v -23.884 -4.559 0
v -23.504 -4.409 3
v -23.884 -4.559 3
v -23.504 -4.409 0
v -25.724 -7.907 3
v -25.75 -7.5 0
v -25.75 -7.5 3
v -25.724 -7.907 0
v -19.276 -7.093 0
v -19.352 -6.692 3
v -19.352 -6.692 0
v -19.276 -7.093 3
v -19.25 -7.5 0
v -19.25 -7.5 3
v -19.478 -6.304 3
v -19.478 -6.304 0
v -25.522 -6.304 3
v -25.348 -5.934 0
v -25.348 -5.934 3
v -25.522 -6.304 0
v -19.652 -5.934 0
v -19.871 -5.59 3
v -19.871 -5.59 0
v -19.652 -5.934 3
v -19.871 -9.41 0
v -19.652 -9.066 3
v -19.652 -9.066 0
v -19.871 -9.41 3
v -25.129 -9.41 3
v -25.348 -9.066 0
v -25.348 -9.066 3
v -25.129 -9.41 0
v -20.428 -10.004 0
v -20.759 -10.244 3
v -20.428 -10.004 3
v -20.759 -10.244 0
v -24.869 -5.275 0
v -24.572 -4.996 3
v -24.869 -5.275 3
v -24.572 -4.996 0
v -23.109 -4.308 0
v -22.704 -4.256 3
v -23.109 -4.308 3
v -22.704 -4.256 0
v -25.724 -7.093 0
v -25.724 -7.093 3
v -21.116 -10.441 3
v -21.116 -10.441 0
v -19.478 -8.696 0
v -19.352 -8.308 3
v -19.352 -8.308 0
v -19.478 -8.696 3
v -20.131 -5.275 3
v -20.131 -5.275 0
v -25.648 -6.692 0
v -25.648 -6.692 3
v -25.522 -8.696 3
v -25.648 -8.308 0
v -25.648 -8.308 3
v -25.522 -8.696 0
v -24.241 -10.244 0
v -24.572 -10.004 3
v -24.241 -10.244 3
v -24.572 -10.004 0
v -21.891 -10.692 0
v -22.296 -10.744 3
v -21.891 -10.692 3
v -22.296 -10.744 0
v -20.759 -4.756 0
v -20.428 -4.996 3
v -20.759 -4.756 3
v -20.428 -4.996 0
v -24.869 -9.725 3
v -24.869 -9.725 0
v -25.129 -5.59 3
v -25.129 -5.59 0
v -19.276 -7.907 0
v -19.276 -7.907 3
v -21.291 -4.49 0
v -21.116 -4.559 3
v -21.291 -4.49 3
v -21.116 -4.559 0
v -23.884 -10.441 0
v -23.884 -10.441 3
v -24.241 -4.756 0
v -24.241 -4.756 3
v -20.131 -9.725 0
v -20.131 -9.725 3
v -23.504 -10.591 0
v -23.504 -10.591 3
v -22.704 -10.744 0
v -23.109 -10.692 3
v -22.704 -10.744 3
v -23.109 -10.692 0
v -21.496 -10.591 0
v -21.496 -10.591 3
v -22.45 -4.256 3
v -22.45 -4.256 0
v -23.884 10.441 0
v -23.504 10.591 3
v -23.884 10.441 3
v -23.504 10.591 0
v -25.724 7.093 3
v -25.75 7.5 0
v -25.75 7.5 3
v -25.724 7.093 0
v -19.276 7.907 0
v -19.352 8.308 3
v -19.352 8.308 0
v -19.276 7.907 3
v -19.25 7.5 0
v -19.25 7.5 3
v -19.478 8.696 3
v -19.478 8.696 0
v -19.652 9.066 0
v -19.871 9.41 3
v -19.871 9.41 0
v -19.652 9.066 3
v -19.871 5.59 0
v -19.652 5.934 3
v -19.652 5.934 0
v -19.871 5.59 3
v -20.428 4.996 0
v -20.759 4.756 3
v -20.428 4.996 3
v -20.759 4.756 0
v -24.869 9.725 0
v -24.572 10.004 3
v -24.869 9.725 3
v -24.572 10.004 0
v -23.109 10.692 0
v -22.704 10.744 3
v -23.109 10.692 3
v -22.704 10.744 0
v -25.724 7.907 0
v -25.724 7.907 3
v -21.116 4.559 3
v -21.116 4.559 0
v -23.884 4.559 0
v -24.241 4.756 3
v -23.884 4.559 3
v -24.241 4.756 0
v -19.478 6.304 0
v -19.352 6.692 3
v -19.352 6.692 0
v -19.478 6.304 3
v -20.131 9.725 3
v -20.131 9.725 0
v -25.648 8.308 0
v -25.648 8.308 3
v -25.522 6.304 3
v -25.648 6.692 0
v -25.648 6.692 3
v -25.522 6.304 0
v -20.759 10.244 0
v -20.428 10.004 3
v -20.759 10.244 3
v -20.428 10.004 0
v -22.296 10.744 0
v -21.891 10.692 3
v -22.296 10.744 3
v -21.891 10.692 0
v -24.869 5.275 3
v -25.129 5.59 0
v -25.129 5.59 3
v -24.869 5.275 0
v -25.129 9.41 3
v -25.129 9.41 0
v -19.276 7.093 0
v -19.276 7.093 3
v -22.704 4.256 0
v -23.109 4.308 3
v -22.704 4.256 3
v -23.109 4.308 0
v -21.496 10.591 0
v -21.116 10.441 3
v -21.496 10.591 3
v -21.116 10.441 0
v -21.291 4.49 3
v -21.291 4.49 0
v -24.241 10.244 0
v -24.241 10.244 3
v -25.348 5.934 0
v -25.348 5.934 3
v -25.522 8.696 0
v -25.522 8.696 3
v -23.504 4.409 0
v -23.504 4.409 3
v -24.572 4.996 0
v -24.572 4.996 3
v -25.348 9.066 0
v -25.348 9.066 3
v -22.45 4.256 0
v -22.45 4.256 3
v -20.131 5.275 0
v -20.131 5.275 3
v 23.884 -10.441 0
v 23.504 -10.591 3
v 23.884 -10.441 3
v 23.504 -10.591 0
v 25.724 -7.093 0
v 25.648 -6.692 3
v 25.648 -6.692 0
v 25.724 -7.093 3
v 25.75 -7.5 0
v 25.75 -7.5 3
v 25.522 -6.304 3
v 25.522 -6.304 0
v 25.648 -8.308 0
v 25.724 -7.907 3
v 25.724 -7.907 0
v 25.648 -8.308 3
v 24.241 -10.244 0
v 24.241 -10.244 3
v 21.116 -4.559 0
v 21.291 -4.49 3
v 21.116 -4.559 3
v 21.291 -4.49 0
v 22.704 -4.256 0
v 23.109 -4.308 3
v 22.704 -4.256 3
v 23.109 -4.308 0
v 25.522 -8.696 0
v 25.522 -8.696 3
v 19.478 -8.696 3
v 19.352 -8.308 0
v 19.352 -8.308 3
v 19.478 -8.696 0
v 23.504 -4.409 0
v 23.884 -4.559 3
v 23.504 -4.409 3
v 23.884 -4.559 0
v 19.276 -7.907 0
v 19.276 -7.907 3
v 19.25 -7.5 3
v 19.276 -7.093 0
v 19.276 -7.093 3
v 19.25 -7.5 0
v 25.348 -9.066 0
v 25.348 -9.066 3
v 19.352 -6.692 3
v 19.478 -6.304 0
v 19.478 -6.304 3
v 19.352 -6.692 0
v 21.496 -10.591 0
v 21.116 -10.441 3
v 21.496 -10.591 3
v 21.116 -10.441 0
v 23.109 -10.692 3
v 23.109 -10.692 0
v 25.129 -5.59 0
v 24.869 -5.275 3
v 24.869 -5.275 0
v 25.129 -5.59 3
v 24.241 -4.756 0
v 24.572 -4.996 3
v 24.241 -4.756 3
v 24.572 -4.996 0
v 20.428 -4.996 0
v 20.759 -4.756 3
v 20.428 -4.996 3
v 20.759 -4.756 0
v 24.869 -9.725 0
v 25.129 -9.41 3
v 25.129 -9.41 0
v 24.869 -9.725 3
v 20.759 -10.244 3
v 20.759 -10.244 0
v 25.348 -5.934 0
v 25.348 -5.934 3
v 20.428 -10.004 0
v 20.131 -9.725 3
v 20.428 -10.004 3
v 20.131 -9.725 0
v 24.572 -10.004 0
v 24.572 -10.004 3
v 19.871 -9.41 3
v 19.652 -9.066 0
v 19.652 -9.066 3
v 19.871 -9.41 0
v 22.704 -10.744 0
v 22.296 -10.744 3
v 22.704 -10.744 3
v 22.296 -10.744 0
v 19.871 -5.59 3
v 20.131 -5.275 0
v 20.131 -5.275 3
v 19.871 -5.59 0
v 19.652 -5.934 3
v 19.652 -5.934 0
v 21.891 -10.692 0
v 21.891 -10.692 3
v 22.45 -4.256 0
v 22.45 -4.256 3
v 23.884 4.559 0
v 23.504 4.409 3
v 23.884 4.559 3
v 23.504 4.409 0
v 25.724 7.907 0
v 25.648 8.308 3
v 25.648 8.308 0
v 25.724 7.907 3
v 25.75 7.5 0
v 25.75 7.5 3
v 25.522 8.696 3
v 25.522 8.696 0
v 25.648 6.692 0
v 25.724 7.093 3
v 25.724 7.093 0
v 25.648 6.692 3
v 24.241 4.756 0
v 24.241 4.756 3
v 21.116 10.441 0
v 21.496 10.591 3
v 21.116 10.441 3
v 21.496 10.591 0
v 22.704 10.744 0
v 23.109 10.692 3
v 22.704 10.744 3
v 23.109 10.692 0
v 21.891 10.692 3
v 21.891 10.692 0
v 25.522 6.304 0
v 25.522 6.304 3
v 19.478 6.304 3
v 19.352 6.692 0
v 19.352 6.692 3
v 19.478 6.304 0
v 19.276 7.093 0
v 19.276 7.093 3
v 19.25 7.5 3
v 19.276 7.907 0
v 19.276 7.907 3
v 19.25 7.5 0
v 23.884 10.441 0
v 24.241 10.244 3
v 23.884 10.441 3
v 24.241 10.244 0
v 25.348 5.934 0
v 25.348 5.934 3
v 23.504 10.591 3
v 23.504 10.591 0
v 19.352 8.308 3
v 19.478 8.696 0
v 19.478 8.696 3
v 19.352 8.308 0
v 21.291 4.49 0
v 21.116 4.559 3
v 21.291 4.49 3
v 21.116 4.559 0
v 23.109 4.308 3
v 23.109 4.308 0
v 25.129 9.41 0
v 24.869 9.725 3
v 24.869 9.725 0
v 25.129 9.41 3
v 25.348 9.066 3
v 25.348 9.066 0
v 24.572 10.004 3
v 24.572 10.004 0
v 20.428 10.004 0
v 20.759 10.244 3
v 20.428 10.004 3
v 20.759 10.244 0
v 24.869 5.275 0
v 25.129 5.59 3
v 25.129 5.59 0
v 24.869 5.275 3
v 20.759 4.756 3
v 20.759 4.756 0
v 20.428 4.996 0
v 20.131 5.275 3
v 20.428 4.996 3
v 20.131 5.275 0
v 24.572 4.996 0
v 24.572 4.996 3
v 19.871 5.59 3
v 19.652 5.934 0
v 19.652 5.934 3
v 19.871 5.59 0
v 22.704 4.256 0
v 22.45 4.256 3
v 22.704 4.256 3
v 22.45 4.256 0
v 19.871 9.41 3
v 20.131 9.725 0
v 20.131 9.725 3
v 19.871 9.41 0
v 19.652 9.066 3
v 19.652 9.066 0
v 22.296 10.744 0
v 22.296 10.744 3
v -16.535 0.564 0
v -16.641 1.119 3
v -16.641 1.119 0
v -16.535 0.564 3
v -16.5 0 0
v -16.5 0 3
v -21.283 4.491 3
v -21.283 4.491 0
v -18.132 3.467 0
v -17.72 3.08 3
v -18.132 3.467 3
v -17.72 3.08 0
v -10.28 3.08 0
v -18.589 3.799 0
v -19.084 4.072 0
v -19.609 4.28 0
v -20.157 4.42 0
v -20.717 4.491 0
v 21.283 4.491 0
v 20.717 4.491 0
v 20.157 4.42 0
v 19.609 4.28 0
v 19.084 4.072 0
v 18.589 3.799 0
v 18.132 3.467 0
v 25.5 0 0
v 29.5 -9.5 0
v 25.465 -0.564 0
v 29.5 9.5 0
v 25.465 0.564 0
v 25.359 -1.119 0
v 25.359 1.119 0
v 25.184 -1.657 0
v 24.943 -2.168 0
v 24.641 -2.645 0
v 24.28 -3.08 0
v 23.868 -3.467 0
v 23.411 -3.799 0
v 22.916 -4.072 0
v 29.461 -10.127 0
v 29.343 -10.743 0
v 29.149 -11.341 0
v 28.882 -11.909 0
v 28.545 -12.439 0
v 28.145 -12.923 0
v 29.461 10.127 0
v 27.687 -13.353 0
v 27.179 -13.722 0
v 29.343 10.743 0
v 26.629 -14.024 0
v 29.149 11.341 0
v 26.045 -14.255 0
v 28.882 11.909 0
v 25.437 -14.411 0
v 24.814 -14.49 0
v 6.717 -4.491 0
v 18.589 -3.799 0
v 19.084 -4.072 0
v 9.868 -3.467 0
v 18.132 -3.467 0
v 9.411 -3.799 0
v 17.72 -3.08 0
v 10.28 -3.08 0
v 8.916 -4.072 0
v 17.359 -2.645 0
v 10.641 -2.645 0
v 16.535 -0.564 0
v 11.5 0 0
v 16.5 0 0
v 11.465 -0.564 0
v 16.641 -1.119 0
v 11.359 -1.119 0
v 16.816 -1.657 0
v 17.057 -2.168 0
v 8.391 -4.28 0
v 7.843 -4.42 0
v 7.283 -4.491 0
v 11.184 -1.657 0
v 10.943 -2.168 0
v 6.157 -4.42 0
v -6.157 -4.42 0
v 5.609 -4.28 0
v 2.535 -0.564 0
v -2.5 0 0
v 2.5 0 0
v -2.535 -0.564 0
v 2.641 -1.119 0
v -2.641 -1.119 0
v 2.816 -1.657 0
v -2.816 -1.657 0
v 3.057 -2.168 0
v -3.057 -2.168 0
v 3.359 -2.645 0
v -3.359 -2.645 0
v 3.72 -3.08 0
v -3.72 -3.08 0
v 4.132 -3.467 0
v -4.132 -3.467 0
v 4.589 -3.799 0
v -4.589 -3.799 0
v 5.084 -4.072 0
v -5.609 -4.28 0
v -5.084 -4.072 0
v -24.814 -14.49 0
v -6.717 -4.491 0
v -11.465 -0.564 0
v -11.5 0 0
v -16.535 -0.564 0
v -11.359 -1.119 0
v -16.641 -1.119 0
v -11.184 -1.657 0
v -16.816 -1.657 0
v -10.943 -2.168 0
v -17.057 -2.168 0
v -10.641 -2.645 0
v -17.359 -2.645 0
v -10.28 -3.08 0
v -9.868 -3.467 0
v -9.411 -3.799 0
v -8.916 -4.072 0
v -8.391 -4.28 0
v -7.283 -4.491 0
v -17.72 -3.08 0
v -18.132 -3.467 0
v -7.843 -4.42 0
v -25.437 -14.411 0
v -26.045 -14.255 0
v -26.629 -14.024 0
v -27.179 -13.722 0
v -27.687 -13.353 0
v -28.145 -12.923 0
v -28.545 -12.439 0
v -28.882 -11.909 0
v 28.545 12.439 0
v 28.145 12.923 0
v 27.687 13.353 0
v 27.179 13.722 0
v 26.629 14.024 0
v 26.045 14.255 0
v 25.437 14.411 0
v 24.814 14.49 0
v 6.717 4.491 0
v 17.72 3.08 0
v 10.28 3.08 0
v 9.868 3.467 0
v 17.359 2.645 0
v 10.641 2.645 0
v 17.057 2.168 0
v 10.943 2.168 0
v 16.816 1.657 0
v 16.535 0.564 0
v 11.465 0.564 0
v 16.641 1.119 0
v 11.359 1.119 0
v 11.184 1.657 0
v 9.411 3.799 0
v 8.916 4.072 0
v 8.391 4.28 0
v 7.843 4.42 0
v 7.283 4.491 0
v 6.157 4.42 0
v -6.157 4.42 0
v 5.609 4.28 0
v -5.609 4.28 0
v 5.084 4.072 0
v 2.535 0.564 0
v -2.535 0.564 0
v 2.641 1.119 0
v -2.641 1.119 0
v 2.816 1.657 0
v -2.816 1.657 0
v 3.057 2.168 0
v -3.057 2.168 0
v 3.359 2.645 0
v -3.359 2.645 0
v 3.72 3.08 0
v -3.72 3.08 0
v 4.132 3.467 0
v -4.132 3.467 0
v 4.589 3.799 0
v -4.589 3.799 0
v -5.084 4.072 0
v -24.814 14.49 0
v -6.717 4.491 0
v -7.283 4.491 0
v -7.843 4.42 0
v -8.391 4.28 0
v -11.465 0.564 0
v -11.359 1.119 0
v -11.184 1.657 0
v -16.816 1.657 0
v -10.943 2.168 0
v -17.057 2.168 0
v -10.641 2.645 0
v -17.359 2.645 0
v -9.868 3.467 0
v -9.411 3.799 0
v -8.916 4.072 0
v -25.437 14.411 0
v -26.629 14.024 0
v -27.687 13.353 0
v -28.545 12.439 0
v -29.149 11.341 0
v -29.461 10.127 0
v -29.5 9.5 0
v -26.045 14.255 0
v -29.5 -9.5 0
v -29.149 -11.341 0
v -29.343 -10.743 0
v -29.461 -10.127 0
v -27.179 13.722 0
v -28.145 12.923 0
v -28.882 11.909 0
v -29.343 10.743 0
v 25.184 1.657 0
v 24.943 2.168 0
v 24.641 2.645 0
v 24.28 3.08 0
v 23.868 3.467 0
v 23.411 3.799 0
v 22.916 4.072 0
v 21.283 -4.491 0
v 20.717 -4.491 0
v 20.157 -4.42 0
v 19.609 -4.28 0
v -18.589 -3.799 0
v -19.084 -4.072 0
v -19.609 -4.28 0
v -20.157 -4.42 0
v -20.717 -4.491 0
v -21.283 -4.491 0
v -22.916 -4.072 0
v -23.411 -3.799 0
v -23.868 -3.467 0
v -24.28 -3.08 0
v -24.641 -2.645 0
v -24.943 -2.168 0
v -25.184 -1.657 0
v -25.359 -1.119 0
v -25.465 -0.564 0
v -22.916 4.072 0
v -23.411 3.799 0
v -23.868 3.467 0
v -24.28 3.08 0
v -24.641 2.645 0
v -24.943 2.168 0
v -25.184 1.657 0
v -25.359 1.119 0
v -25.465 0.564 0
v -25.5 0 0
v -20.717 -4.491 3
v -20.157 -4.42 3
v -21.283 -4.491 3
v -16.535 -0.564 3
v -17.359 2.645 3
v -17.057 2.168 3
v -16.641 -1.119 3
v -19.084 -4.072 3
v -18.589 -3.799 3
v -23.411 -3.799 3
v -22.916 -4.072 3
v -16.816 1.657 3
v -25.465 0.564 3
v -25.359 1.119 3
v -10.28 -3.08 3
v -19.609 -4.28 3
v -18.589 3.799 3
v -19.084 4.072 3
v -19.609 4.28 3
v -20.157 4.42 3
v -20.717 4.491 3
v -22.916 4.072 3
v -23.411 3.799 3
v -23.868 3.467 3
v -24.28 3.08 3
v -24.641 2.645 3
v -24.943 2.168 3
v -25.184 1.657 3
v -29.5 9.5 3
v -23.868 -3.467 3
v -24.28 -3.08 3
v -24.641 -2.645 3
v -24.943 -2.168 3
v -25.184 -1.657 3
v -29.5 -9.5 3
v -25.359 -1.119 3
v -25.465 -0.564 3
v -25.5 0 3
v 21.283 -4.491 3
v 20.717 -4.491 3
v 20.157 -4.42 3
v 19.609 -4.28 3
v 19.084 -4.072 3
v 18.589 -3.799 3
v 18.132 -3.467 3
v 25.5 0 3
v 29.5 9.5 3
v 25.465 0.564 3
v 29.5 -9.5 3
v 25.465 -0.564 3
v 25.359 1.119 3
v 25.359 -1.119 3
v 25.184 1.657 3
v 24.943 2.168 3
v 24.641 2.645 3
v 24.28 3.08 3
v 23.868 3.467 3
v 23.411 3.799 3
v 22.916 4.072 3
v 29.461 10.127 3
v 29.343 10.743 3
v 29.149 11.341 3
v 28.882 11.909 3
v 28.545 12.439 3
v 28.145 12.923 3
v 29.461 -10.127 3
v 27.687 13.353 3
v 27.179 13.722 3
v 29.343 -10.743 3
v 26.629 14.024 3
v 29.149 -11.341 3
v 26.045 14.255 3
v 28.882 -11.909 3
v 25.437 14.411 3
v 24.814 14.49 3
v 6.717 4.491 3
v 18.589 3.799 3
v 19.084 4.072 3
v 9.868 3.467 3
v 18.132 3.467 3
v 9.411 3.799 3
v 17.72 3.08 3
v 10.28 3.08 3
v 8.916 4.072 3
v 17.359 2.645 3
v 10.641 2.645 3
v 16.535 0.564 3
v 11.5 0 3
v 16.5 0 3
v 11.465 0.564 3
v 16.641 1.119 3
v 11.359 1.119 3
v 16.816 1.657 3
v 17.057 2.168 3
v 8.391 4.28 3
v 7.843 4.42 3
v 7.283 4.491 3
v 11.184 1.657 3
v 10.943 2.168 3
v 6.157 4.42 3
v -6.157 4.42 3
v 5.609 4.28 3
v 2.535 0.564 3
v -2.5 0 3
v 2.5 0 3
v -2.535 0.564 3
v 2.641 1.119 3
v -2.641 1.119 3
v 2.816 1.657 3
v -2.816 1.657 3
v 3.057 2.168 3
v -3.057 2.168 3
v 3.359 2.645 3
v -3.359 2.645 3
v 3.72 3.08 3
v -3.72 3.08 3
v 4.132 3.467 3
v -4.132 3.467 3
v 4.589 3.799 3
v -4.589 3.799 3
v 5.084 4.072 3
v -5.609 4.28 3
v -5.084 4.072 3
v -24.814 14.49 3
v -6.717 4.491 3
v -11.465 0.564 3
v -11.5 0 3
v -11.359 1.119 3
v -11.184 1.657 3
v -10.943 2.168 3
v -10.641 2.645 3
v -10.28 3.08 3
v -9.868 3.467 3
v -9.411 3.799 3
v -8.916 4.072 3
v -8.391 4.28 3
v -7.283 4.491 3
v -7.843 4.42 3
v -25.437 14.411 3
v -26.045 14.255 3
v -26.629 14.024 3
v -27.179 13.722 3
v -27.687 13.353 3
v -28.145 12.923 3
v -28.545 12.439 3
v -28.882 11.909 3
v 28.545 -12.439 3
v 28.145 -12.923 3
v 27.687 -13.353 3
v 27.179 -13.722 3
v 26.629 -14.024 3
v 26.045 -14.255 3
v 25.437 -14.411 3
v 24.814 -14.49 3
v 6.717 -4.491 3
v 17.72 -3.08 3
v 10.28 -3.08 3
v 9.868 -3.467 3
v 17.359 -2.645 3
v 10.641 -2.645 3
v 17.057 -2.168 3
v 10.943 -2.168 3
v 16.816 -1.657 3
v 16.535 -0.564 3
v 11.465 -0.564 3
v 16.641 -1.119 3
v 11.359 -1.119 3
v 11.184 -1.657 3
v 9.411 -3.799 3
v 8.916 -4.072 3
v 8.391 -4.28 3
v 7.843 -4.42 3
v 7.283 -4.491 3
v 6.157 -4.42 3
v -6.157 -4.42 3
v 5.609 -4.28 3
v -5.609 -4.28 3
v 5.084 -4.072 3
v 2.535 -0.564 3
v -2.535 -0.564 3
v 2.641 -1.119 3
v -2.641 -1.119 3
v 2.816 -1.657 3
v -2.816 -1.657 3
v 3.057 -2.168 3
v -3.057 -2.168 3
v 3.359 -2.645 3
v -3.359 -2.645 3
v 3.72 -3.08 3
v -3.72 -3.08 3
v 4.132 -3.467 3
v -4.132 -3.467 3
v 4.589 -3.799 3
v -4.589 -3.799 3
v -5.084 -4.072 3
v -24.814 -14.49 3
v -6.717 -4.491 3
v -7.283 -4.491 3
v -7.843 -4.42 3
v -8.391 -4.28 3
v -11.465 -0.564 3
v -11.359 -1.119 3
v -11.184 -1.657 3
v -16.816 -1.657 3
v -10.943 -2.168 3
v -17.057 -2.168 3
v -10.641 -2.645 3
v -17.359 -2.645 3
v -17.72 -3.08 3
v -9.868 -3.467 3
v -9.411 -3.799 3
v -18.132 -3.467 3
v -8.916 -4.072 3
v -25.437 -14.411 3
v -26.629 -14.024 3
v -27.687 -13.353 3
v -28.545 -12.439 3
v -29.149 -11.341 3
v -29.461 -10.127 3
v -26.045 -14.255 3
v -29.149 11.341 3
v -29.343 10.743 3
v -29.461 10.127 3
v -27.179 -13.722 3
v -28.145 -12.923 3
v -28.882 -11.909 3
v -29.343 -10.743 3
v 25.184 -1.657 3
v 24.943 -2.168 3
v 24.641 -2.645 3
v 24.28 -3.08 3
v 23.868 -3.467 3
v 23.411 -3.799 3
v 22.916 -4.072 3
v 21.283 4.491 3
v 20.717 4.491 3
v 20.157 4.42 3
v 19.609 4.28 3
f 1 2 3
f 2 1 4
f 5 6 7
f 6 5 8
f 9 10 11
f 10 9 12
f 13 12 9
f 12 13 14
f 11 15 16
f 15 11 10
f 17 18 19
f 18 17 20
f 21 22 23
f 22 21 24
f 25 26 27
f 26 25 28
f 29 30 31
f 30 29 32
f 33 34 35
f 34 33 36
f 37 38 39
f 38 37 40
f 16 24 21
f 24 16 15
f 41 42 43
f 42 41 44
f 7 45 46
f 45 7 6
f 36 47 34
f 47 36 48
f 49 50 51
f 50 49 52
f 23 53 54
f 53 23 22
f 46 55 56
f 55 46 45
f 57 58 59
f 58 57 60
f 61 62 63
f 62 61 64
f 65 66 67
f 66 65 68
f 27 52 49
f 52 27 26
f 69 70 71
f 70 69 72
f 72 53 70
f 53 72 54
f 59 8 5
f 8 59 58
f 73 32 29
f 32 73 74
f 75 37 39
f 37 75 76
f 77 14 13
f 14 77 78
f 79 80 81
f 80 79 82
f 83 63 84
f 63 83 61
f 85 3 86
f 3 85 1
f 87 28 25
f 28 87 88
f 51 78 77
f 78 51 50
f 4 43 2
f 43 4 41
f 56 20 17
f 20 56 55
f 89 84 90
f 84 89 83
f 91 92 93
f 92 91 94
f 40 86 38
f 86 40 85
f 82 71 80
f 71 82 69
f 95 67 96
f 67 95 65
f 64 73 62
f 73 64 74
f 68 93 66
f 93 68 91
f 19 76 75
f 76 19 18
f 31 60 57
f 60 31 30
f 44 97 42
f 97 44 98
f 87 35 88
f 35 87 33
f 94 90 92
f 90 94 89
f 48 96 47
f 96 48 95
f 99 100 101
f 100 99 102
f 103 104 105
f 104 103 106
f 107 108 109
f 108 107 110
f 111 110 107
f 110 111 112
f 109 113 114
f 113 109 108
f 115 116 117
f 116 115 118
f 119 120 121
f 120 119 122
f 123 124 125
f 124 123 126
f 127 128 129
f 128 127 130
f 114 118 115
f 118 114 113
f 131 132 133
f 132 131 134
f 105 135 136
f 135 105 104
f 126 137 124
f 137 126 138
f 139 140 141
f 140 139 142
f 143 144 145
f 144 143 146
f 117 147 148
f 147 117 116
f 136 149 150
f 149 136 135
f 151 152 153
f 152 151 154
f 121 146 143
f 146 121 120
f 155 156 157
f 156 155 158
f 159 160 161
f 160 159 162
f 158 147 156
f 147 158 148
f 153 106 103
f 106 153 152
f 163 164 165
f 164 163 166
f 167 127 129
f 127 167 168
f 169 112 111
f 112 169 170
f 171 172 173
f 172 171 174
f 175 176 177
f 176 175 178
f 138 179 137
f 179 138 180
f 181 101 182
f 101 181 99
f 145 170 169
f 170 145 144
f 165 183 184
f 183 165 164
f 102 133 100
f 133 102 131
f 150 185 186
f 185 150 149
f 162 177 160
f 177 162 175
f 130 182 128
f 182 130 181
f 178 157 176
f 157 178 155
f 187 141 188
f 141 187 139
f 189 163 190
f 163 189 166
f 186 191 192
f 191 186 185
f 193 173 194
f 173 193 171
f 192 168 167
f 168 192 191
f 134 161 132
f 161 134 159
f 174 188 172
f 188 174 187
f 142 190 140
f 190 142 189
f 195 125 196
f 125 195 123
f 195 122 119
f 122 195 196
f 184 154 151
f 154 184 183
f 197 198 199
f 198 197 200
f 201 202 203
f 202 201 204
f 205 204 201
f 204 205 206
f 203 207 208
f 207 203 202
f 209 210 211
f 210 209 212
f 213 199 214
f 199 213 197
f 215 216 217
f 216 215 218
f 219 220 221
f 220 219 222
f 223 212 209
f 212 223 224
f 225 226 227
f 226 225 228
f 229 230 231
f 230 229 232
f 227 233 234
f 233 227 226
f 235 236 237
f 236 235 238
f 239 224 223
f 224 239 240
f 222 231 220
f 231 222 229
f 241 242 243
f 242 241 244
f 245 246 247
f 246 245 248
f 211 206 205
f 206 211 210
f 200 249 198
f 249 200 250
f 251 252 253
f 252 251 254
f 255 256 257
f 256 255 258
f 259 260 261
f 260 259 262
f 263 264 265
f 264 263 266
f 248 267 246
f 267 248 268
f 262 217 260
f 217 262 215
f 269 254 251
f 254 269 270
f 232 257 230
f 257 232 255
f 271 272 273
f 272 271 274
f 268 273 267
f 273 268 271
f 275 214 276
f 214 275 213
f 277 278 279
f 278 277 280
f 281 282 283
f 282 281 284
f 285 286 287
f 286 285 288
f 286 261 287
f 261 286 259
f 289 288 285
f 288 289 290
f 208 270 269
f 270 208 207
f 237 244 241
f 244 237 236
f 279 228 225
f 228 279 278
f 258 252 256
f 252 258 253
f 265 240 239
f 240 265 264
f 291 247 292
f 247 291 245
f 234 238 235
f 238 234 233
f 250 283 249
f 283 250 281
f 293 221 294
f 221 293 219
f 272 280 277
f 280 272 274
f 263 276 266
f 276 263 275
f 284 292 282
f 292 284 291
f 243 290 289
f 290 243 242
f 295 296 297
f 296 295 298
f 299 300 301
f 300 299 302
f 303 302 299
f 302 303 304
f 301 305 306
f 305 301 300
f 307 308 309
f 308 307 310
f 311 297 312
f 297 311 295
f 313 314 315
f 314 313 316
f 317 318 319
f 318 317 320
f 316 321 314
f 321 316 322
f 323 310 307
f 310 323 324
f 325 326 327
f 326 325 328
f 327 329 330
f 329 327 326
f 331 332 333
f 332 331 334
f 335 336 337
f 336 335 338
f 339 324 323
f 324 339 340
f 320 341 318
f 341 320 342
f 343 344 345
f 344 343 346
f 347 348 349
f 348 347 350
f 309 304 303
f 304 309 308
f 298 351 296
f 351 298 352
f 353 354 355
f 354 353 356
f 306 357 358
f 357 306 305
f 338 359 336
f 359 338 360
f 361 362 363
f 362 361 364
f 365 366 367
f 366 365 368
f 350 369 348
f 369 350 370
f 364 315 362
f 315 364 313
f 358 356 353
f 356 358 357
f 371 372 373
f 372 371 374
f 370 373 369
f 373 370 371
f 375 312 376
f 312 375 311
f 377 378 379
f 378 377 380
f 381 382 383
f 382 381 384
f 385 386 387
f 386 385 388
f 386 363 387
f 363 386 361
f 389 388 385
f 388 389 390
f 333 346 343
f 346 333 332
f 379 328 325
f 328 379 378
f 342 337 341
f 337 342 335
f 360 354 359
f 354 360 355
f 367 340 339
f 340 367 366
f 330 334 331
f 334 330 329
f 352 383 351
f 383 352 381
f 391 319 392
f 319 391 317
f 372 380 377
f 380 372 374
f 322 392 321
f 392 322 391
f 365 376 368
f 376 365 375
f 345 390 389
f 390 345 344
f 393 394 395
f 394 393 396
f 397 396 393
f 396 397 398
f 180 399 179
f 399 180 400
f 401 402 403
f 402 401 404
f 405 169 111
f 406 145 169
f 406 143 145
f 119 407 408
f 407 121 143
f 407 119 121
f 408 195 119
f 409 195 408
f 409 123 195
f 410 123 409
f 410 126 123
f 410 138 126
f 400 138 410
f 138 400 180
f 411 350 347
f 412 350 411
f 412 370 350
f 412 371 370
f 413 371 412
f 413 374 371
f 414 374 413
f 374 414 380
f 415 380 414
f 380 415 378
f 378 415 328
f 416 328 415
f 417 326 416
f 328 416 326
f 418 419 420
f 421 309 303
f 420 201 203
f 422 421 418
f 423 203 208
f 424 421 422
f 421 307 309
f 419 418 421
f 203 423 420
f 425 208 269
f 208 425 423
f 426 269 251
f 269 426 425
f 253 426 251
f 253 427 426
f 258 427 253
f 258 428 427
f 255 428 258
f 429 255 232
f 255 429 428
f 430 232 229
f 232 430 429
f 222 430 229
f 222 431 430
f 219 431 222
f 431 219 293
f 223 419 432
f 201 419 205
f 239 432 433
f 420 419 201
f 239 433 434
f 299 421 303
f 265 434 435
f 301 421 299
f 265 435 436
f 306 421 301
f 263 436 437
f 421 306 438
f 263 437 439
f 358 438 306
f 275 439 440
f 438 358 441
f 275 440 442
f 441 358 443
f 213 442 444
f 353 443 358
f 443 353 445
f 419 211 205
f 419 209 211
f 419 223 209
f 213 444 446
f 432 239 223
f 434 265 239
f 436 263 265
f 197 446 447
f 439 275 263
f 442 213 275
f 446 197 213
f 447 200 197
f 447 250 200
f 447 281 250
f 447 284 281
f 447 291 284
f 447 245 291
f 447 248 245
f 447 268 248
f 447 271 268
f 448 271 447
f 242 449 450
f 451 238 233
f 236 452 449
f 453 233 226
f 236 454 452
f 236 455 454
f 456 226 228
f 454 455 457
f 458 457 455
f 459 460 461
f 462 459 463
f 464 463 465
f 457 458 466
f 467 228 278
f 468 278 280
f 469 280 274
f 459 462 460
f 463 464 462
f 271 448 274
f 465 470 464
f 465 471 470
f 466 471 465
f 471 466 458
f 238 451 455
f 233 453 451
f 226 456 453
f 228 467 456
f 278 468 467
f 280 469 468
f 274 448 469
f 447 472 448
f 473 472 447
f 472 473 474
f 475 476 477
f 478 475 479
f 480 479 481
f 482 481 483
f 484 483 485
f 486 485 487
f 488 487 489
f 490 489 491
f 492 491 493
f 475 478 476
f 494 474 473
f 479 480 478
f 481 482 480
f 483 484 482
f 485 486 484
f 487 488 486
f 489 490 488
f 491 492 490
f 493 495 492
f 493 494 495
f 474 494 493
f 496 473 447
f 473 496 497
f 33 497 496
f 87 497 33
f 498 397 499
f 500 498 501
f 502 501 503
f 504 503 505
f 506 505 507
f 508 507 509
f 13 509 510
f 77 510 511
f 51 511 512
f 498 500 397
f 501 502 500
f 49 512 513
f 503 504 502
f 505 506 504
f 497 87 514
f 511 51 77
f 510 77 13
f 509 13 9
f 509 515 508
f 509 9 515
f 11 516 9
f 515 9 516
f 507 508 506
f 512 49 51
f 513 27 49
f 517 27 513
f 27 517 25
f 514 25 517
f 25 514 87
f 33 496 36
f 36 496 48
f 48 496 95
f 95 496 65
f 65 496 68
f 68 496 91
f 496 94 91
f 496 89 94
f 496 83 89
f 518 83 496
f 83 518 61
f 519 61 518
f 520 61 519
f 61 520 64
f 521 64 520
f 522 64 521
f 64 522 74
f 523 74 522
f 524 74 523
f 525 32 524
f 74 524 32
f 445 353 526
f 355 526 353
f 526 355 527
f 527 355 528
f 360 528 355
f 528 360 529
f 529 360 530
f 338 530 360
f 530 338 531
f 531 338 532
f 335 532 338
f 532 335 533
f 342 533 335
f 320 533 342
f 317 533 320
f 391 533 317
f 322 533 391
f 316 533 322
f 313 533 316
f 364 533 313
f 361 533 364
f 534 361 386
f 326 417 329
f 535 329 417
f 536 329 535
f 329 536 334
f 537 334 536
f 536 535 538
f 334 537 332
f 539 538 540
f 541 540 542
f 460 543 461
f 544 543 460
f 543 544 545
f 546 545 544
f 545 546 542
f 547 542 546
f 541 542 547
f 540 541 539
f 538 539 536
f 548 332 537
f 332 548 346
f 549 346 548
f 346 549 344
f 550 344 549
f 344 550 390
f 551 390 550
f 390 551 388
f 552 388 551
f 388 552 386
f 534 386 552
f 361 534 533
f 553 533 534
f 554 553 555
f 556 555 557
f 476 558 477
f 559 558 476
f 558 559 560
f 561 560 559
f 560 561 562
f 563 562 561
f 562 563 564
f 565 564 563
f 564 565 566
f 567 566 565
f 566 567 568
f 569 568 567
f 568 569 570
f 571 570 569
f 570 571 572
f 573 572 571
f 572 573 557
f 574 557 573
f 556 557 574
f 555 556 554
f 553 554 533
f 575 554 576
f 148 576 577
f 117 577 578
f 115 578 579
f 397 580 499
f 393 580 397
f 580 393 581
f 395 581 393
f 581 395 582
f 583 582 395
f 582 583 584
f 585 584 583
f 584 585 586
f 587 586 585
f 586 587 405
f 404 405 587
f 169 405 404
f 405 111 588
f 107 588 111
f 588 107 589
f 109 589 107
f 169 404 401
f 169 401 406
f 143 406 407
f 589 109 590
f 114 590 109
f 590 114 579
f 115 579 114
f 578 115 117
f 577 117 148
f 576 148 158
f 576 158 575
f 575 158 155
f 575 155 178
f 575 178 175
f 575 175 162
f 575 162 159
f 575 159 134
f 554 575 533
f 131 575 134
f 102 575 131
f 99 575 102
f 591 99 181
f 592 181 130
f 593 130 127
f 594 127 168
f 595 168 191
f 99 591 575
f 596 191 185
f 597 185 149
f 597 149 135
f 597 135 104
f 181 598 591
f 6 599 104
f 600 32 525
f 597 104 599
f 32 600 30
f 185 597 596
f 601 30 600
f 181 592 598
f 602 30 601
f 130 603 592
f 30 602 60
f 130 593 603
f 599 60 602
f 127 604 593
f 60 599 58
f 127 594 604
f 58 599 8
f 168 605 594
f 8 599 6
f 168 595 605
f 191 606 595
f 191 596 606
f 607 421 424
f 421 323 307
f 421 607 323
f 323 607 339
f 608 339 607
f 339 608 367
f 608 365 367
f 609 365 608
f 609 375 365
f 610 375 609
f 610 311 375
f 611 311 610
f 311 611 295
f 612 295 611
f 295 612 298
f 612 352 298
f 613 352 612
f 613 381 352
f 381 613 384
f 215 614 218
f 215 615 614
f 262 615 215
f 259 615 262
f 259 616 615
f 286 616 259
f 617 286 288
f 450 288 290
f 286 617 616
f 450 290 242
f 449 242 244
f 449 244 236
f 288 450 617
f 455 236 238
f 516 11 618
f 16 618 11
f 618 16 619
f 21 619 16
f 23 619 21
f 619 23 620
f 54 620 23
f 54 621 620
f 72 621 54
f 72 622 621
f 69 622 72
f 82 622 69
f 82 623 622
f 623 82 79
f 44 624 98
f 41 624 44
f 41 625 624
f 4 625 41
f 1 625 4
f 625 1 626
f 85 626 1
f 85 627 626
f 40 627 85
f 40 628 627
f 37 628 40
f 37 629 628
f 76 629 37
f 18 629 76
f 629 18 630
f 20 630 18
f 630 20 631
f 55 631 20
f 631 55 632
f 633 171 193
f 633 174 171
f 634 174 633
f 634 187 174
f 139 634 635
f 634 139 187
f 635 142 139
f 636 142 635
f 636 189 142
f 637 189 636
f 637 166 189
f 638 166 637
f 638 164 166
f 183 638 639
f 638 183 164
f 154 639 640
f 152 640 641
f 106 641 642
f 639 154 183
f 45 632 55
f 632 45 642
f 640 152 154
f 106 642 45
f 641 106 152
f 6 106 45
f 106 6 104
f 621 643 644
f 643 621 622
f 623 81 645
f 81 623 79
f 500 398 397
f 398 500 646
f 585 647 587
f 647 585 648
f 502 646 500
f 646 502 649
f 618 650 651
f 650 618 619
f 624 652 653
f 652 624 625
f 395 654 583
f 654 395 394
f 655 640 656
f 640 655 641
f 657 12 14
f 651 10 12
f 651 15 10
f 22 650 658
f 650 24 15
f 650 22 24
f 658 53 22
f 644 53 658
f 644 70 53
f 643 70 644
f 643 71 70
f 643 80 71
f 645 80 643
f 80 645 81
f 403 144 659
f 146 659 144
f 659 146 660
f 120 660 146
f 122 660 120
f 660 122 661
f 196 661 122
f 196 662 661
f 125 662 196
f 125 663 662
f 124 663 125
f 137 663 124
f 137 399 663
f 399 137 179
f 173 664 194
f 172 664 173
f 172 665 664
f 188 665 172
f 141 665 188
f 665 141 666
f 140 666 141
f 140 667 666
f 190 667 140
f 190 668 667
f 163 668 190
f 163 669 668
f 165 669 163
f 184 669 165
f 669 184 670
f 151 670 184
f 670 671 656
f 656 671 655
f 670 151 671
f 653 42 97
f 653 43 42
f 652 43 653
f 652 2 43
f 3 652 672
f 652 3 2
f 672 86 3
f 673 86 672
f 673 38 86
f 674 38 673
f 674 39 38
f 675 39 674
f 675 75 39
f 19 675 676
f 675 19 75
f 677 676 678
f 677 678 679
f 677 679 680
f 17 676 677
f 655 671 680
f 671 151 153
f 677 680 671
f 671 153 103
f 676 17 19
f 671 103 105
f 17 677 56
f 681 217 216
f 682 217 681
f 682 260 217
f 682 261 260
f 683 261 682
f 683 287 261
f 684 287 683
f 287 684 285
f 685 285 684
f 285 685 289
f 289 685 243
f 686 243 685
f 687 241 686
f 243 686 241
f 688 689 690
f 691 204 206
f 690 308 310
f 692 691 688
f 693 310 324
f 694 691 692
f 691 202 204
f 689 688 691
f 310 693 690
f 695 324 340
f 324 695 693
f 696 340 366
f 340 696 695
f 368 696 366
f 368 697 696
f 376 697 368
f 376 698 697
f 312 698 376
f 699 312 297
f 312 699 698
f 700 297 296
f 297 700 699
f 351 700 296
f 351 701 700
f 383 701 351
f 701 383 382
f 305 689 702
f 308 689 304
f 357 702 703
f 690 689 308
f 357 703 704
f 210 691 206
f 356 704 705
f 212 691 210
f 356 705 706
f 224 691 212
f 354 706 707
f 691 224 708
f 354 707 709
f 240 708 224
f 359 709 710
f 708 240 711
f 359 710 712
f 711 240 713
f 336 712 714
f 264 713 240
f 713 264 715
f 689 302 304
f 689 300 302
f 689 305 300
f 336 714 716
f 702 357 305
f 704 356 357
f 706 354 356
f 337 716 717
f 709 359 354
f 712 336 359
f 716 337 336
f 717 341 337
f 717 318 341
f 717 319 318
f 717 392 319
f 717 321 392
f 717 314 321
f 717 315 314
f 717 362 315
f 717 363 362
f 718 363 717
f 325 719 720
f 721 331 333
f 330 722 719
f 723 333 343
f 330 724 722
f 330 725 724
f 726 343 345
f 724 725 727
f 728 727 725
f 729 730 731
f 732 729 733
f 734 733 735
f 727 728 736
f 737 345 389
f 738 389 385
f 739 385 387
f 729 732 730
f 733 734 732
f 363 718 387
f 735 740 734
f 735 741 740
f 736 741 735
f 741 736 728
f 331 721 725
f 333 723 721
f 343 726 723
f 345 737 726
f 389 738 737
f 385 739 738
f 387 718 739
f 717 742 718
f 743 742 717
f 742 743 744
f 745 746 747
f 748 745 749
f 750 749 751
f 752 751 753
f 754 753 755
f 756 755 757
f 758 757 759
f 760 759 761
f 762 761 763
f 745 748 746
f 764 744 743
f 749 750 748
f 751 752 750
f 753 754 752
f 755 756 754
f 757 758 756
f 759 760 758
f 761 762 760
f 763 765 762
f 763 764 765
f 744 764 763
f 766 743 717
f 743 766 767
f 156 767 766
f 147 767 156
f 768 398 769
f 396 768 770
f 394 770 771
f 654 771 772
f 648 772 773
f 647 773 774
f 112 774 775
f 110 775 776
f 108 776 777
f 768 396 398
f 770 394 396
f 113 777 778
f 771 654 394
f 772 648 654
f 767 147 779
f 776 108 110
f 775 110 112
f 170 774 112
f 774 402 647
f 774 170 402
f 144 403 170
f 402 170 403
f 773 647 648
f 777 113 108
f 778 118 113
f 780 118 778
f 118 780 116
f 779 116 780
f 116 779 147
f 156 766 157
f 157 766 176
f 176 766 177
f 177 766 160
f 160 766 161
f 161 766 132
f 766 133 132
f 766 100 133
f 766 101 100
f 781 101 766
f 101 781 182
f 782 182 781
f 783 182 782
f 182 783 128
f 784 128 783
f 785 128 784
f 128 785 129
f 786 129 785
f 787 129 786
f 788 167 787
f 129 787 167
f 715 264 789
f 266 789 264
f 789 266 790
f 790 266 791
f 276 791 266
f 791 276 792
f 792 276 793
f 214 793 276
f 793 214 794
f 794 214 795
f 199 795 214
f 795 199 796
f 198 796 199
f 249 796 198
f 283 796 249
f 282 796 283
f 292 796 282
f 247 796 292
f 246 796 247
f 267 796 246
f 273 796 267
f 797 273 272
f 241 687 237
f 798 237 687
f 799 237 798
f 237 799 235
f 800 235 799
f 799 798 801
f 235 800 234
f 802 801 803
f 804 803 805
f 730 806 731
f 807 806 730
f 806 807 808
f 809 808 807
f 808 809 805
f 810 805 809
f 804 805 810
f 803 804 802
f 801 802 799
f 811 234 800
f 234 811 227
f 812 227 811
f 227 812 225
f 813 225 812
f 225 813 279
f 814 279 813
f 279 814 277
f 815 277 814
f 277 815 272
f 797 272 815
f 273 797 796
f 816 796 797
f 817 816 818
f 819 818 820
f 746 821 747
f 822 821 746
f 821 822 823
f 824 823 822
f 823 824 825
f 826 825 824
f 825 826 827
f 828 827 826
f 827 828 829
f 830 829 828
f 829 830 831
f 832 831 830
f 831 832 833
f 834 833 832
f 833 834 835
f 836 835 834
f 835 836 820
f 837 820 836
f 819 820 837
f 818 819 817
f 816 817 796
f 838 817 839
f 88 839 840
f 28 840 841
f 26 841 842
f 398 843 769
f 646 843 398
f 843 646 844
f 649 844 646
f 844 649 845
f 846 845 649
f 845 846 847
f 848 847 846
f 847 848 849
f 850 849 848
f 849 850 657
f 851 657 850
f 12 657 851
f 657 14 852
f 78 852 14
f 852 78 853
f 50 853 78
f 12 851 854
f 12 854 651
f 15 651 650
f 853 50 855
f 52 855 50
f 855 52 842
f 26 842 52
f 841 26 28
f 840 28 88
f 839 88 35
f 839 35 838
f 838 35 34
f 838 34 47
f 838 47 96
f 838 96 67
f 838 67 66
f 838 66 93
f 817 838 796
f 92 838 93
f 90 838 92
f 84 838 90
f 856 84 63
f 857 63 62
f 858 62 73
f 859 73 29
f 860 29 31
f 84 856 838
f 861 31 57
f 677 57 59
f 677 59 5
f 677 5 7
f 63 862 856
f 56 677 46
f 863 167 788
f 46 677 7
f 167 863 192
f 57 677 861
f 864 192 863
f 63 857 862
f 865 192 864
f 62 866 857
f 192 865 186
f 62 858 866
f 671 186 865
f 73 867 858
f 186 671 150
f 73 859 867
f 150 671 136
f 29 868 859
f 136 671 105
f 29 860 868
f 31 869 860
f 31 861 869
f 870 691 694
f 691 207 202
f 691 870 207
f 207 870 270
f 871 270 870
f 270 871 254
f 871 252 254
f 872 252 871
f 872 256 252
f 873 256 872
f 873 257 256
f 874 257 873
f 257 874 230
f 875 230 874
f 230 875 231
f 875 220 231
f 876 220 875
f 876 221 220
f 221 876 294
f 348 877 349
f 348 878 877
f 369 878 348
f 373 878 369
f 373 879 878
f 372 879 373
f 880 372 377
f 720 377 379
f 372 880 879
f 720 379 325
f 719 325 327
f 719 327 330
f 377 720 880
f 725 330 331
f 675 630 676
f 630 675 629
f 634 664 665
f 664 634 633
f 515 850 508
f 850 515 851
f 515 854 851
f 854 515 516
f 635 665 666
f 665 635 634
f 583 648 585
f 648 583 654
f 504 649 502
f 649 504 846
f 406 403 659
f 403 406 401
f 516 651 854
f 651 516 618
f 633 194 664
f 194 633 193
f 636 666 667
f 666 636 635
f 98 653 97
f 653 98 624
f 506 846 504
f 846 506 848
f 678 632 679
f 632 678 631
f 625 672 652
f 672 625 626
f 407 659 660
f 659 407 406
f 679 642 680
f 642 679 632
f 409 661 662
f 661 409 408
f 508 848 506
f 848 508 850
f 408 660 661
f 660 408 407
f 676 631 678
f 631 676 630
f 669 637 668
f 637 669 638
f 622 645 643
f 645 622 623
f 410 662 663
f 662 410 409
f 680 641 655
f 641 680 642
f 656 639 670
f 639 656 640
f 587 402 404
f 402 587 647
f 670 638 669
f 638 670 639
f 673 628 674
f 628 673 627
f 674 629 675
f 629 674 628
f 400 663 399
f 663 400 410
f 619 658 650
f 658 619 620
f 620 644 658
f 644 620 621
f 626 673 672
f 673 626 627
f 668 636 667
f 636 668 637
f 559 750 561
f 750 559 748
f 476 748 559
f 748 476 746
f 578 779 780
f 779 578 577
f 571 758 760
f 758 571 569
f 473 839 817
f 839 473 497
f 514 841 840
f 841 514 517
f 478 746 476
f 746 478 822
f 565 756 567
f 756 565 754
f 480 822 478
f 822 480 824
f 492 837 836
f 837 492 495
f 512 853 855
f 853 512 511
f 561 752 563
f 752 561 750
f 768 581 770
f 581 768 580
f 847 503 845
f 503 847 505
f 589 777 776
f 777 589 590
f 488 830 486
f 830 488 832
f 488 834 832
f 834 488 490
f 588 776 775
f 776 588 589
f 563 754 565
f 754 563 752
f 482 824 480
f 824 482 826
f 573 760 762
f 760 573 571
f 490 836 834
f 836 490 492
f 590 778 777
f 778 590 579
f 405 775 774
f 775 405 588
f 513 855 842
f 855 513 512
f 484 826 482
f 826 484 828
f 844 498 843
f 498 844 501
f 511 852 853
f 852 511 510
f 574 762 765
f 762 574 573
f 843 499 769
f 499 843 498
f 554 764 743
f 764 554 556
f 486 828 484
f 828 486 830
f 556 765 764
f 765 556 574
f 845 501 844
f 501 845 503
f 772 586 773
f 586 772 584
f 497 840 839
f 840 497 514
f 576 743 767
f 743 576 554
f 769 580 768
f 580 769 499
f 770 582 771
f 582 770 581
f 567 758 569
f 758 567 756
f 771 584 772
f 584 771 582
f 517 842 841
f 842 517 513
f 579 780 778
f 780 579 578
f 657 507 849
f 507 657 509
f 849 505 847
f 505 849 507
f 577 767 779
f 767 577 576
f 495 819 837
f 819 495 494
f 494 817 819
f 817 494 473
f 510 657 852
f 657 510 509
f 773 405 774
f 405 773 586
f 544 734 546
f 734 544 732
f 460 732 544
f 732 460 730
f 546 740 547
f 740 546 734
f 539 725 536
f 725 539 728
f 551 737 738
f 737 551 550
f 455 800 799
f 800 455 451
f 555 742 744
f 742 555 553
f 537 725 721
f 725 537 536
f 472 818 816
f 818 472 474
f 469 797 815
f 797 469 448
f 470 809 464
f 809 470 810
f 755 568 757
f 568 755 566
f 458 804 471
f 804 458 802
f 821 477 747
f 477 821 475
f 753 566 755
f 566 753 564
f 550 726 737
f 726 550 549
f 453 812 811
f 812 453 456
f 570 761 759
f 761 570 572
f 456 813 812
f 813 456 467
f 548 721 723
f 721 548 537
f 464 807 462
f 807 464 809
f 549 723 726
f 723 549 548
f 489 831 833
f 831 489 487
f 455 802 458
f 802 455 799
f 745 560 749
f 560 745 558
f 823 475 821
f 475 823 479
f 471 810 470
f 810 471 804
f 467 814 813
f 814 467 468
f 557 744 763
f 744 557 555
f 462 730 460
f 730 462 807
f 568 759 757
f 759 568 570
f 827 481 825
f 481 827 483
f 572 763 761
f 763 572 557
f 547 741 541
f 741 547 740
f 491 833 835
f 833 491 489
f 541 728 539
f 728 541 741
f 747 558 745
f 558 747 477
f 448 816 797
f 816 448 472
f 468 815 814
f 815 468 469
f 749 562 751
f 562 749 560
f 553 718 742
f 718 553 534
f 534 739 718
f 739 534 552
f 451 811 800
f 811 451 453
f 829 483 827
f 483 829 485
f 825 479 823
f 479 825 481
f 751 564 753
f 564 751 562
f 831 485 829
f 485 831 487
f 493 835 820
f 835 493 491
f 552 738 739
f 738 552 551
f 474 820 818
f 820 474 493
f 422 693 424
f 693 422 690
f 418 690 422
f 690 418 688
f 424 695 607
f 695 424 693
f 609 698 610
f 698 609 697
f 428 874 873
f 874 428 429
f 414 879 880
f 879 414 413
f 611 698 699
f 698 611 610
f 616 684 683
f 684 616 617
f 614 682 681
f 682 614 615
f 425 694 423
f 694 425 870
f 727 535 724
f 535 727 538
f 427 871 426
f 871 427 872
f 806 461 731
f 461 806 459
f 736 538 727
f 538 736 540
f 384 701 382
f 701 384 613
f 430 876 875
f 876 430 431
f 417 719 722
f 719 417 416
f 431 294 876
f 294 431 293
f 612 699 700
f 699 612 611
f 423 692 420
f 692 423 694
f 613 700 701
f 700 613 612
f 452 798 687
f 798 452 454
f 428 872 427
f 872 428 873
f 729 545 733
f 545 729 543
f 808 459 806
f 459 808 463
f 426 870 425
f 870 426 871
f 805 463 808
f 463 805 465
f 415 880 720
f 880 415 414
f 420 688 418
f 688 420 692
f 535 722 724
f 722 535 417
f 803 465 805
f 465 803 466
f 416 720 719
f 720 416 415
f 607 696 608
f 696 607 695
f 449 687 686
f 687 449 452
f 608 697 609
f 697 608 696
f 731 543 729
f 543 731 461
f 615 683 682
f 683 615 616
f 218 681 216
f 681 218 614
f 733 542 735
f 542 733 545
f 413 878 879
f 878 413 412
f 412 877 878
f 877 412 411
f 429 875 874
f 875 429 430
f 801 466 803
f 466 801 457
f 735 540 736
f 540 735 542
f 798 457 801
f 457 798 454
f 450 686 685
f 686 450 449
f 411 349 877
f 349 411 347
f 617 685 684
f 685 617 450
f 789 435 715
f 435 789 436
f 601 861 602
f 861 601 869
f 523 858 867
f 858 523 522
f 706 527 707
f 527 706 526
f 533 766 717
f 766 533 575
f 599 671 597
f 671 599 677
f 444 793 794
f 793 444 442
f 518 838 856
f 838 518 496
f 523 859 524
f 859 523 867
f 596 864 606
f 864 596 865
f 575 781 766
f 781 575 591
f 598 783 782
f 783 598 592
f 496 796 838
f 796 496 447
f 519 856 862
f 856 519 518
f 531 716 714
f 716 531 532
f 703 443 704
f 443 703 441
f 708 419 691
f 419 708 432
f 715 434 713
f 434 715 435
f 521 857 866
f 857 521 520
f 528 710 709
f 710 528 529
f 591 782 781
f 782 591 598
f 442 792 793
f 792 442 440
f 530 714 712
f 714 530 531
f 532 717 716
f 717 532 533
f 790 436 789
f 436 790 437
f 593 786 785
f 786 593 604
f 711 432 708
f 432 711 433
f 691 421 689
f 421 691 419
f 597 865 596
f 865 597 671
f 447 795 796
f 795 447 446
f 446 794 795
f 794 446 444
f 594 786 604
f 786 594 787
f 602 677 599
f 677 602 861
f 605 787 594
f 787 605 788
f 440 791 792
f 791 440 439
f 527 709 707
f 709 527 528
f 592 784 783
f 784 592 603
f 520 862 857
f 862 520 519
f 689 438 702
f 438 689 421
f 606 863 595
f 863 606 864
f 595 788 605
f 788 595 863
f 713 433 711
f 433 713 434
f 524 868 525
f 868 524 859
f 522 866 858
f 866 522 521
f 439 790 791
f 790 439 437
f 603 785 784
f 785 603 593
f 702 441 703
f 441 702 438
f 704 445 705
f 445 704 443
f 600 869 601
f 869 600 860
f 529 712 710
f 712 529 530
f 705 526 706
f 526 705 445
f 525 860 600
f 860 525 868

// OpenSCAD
$fn = 50;


difference() {
	union() {
		hull() {
			translate(v = [-24.5000000000, 9.5000000000, 0]) {
				cylinder(h = 3, r = 5);
			}
			translate(v = [24.5000000000, 9.5000000000, 0]) {
				cylinder(h = 3, r = 5);
			}
			translate(v = [-24.5000000000, -9.5000000000, 0]) {
				cylinder(h = 3, r = 5);
			}
			translate(v = [24.5000000000, -9.5000000000, 0]) {
				cylinder(h = 3, r = 5);
			}
		}
	}
	union() {
		#translate(v = [-22.5000000000, -7.5000000000, -100.0000000000]) {
			cylinder(h = 200, r = 3.2500000000);
		}
		#translate(v = [-22.5000000000, 7.5000000000, -100.0000000000]) {
			cylinder(h = 200, r = 3.2500000000);
		}
		#translate(v = [22.5000000000, -7.5000000000, -100.0000000000]) {
			cylinder(h = 200, r = 3.2500000000);
		}
		#translate(v = [22.5000000000, 7.5000000000, -100.0000000000]) {
			cylinder(h = 200, r = 3.2500000000);
		}
		#translate(v = [-21.0000000000, 0, 0]) {
			cylinder(h = 3, r = 4.5000000000);
		}
		#translate(v = [-7.0000000000, 0, 0]) {
			cylinder(h = 3, r = 4.5000000000);
		}
		#translate(v = [7.0000000000, 0, 0]) {
			cylinder(h = 3, r = 4.5000000000);
		}
		#translate(v = [21.0000000000, 0, 0]) {
			cylinder(h = 3, r = 4.5000000000);
		}
	}
}
